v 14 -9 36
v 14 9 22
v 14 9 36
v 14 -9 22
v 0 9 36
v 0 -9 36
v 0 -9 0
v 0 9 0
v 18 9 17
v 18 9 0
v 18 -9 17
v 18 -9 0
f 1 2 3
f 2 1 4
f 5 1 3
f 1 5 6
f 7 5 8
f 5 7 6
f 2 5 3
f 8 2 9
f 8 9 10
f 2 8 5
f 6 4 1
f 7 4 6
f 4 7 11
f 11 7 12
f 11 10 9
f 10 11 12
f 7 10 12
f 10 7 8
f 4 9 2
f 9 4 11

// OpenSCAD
module p()
{
    union()
    {
        translate([14/2,0,7 + 36-14])cube([14,18,14], center=true);
        translate([18/2,0,17/2])cube([18,18,17],center=true);
        color("red", 0.5)hull(){
        translate([0.5,0,16.5])cube([1,18,1],center=true);
        translate([0.5,0,16.5 + 5])cube([1,18,1],center=true);
        translate([0.5 + 17,0,16.5 ])cube([1,18,1],center=true);
        translate([0.5+13,0,16.5 + 5])cube([1,18,1],center=true);}
    }
}

module prox_sensor(){
    color([0,1,0],0.8)p();
    }

prox_sensor();
